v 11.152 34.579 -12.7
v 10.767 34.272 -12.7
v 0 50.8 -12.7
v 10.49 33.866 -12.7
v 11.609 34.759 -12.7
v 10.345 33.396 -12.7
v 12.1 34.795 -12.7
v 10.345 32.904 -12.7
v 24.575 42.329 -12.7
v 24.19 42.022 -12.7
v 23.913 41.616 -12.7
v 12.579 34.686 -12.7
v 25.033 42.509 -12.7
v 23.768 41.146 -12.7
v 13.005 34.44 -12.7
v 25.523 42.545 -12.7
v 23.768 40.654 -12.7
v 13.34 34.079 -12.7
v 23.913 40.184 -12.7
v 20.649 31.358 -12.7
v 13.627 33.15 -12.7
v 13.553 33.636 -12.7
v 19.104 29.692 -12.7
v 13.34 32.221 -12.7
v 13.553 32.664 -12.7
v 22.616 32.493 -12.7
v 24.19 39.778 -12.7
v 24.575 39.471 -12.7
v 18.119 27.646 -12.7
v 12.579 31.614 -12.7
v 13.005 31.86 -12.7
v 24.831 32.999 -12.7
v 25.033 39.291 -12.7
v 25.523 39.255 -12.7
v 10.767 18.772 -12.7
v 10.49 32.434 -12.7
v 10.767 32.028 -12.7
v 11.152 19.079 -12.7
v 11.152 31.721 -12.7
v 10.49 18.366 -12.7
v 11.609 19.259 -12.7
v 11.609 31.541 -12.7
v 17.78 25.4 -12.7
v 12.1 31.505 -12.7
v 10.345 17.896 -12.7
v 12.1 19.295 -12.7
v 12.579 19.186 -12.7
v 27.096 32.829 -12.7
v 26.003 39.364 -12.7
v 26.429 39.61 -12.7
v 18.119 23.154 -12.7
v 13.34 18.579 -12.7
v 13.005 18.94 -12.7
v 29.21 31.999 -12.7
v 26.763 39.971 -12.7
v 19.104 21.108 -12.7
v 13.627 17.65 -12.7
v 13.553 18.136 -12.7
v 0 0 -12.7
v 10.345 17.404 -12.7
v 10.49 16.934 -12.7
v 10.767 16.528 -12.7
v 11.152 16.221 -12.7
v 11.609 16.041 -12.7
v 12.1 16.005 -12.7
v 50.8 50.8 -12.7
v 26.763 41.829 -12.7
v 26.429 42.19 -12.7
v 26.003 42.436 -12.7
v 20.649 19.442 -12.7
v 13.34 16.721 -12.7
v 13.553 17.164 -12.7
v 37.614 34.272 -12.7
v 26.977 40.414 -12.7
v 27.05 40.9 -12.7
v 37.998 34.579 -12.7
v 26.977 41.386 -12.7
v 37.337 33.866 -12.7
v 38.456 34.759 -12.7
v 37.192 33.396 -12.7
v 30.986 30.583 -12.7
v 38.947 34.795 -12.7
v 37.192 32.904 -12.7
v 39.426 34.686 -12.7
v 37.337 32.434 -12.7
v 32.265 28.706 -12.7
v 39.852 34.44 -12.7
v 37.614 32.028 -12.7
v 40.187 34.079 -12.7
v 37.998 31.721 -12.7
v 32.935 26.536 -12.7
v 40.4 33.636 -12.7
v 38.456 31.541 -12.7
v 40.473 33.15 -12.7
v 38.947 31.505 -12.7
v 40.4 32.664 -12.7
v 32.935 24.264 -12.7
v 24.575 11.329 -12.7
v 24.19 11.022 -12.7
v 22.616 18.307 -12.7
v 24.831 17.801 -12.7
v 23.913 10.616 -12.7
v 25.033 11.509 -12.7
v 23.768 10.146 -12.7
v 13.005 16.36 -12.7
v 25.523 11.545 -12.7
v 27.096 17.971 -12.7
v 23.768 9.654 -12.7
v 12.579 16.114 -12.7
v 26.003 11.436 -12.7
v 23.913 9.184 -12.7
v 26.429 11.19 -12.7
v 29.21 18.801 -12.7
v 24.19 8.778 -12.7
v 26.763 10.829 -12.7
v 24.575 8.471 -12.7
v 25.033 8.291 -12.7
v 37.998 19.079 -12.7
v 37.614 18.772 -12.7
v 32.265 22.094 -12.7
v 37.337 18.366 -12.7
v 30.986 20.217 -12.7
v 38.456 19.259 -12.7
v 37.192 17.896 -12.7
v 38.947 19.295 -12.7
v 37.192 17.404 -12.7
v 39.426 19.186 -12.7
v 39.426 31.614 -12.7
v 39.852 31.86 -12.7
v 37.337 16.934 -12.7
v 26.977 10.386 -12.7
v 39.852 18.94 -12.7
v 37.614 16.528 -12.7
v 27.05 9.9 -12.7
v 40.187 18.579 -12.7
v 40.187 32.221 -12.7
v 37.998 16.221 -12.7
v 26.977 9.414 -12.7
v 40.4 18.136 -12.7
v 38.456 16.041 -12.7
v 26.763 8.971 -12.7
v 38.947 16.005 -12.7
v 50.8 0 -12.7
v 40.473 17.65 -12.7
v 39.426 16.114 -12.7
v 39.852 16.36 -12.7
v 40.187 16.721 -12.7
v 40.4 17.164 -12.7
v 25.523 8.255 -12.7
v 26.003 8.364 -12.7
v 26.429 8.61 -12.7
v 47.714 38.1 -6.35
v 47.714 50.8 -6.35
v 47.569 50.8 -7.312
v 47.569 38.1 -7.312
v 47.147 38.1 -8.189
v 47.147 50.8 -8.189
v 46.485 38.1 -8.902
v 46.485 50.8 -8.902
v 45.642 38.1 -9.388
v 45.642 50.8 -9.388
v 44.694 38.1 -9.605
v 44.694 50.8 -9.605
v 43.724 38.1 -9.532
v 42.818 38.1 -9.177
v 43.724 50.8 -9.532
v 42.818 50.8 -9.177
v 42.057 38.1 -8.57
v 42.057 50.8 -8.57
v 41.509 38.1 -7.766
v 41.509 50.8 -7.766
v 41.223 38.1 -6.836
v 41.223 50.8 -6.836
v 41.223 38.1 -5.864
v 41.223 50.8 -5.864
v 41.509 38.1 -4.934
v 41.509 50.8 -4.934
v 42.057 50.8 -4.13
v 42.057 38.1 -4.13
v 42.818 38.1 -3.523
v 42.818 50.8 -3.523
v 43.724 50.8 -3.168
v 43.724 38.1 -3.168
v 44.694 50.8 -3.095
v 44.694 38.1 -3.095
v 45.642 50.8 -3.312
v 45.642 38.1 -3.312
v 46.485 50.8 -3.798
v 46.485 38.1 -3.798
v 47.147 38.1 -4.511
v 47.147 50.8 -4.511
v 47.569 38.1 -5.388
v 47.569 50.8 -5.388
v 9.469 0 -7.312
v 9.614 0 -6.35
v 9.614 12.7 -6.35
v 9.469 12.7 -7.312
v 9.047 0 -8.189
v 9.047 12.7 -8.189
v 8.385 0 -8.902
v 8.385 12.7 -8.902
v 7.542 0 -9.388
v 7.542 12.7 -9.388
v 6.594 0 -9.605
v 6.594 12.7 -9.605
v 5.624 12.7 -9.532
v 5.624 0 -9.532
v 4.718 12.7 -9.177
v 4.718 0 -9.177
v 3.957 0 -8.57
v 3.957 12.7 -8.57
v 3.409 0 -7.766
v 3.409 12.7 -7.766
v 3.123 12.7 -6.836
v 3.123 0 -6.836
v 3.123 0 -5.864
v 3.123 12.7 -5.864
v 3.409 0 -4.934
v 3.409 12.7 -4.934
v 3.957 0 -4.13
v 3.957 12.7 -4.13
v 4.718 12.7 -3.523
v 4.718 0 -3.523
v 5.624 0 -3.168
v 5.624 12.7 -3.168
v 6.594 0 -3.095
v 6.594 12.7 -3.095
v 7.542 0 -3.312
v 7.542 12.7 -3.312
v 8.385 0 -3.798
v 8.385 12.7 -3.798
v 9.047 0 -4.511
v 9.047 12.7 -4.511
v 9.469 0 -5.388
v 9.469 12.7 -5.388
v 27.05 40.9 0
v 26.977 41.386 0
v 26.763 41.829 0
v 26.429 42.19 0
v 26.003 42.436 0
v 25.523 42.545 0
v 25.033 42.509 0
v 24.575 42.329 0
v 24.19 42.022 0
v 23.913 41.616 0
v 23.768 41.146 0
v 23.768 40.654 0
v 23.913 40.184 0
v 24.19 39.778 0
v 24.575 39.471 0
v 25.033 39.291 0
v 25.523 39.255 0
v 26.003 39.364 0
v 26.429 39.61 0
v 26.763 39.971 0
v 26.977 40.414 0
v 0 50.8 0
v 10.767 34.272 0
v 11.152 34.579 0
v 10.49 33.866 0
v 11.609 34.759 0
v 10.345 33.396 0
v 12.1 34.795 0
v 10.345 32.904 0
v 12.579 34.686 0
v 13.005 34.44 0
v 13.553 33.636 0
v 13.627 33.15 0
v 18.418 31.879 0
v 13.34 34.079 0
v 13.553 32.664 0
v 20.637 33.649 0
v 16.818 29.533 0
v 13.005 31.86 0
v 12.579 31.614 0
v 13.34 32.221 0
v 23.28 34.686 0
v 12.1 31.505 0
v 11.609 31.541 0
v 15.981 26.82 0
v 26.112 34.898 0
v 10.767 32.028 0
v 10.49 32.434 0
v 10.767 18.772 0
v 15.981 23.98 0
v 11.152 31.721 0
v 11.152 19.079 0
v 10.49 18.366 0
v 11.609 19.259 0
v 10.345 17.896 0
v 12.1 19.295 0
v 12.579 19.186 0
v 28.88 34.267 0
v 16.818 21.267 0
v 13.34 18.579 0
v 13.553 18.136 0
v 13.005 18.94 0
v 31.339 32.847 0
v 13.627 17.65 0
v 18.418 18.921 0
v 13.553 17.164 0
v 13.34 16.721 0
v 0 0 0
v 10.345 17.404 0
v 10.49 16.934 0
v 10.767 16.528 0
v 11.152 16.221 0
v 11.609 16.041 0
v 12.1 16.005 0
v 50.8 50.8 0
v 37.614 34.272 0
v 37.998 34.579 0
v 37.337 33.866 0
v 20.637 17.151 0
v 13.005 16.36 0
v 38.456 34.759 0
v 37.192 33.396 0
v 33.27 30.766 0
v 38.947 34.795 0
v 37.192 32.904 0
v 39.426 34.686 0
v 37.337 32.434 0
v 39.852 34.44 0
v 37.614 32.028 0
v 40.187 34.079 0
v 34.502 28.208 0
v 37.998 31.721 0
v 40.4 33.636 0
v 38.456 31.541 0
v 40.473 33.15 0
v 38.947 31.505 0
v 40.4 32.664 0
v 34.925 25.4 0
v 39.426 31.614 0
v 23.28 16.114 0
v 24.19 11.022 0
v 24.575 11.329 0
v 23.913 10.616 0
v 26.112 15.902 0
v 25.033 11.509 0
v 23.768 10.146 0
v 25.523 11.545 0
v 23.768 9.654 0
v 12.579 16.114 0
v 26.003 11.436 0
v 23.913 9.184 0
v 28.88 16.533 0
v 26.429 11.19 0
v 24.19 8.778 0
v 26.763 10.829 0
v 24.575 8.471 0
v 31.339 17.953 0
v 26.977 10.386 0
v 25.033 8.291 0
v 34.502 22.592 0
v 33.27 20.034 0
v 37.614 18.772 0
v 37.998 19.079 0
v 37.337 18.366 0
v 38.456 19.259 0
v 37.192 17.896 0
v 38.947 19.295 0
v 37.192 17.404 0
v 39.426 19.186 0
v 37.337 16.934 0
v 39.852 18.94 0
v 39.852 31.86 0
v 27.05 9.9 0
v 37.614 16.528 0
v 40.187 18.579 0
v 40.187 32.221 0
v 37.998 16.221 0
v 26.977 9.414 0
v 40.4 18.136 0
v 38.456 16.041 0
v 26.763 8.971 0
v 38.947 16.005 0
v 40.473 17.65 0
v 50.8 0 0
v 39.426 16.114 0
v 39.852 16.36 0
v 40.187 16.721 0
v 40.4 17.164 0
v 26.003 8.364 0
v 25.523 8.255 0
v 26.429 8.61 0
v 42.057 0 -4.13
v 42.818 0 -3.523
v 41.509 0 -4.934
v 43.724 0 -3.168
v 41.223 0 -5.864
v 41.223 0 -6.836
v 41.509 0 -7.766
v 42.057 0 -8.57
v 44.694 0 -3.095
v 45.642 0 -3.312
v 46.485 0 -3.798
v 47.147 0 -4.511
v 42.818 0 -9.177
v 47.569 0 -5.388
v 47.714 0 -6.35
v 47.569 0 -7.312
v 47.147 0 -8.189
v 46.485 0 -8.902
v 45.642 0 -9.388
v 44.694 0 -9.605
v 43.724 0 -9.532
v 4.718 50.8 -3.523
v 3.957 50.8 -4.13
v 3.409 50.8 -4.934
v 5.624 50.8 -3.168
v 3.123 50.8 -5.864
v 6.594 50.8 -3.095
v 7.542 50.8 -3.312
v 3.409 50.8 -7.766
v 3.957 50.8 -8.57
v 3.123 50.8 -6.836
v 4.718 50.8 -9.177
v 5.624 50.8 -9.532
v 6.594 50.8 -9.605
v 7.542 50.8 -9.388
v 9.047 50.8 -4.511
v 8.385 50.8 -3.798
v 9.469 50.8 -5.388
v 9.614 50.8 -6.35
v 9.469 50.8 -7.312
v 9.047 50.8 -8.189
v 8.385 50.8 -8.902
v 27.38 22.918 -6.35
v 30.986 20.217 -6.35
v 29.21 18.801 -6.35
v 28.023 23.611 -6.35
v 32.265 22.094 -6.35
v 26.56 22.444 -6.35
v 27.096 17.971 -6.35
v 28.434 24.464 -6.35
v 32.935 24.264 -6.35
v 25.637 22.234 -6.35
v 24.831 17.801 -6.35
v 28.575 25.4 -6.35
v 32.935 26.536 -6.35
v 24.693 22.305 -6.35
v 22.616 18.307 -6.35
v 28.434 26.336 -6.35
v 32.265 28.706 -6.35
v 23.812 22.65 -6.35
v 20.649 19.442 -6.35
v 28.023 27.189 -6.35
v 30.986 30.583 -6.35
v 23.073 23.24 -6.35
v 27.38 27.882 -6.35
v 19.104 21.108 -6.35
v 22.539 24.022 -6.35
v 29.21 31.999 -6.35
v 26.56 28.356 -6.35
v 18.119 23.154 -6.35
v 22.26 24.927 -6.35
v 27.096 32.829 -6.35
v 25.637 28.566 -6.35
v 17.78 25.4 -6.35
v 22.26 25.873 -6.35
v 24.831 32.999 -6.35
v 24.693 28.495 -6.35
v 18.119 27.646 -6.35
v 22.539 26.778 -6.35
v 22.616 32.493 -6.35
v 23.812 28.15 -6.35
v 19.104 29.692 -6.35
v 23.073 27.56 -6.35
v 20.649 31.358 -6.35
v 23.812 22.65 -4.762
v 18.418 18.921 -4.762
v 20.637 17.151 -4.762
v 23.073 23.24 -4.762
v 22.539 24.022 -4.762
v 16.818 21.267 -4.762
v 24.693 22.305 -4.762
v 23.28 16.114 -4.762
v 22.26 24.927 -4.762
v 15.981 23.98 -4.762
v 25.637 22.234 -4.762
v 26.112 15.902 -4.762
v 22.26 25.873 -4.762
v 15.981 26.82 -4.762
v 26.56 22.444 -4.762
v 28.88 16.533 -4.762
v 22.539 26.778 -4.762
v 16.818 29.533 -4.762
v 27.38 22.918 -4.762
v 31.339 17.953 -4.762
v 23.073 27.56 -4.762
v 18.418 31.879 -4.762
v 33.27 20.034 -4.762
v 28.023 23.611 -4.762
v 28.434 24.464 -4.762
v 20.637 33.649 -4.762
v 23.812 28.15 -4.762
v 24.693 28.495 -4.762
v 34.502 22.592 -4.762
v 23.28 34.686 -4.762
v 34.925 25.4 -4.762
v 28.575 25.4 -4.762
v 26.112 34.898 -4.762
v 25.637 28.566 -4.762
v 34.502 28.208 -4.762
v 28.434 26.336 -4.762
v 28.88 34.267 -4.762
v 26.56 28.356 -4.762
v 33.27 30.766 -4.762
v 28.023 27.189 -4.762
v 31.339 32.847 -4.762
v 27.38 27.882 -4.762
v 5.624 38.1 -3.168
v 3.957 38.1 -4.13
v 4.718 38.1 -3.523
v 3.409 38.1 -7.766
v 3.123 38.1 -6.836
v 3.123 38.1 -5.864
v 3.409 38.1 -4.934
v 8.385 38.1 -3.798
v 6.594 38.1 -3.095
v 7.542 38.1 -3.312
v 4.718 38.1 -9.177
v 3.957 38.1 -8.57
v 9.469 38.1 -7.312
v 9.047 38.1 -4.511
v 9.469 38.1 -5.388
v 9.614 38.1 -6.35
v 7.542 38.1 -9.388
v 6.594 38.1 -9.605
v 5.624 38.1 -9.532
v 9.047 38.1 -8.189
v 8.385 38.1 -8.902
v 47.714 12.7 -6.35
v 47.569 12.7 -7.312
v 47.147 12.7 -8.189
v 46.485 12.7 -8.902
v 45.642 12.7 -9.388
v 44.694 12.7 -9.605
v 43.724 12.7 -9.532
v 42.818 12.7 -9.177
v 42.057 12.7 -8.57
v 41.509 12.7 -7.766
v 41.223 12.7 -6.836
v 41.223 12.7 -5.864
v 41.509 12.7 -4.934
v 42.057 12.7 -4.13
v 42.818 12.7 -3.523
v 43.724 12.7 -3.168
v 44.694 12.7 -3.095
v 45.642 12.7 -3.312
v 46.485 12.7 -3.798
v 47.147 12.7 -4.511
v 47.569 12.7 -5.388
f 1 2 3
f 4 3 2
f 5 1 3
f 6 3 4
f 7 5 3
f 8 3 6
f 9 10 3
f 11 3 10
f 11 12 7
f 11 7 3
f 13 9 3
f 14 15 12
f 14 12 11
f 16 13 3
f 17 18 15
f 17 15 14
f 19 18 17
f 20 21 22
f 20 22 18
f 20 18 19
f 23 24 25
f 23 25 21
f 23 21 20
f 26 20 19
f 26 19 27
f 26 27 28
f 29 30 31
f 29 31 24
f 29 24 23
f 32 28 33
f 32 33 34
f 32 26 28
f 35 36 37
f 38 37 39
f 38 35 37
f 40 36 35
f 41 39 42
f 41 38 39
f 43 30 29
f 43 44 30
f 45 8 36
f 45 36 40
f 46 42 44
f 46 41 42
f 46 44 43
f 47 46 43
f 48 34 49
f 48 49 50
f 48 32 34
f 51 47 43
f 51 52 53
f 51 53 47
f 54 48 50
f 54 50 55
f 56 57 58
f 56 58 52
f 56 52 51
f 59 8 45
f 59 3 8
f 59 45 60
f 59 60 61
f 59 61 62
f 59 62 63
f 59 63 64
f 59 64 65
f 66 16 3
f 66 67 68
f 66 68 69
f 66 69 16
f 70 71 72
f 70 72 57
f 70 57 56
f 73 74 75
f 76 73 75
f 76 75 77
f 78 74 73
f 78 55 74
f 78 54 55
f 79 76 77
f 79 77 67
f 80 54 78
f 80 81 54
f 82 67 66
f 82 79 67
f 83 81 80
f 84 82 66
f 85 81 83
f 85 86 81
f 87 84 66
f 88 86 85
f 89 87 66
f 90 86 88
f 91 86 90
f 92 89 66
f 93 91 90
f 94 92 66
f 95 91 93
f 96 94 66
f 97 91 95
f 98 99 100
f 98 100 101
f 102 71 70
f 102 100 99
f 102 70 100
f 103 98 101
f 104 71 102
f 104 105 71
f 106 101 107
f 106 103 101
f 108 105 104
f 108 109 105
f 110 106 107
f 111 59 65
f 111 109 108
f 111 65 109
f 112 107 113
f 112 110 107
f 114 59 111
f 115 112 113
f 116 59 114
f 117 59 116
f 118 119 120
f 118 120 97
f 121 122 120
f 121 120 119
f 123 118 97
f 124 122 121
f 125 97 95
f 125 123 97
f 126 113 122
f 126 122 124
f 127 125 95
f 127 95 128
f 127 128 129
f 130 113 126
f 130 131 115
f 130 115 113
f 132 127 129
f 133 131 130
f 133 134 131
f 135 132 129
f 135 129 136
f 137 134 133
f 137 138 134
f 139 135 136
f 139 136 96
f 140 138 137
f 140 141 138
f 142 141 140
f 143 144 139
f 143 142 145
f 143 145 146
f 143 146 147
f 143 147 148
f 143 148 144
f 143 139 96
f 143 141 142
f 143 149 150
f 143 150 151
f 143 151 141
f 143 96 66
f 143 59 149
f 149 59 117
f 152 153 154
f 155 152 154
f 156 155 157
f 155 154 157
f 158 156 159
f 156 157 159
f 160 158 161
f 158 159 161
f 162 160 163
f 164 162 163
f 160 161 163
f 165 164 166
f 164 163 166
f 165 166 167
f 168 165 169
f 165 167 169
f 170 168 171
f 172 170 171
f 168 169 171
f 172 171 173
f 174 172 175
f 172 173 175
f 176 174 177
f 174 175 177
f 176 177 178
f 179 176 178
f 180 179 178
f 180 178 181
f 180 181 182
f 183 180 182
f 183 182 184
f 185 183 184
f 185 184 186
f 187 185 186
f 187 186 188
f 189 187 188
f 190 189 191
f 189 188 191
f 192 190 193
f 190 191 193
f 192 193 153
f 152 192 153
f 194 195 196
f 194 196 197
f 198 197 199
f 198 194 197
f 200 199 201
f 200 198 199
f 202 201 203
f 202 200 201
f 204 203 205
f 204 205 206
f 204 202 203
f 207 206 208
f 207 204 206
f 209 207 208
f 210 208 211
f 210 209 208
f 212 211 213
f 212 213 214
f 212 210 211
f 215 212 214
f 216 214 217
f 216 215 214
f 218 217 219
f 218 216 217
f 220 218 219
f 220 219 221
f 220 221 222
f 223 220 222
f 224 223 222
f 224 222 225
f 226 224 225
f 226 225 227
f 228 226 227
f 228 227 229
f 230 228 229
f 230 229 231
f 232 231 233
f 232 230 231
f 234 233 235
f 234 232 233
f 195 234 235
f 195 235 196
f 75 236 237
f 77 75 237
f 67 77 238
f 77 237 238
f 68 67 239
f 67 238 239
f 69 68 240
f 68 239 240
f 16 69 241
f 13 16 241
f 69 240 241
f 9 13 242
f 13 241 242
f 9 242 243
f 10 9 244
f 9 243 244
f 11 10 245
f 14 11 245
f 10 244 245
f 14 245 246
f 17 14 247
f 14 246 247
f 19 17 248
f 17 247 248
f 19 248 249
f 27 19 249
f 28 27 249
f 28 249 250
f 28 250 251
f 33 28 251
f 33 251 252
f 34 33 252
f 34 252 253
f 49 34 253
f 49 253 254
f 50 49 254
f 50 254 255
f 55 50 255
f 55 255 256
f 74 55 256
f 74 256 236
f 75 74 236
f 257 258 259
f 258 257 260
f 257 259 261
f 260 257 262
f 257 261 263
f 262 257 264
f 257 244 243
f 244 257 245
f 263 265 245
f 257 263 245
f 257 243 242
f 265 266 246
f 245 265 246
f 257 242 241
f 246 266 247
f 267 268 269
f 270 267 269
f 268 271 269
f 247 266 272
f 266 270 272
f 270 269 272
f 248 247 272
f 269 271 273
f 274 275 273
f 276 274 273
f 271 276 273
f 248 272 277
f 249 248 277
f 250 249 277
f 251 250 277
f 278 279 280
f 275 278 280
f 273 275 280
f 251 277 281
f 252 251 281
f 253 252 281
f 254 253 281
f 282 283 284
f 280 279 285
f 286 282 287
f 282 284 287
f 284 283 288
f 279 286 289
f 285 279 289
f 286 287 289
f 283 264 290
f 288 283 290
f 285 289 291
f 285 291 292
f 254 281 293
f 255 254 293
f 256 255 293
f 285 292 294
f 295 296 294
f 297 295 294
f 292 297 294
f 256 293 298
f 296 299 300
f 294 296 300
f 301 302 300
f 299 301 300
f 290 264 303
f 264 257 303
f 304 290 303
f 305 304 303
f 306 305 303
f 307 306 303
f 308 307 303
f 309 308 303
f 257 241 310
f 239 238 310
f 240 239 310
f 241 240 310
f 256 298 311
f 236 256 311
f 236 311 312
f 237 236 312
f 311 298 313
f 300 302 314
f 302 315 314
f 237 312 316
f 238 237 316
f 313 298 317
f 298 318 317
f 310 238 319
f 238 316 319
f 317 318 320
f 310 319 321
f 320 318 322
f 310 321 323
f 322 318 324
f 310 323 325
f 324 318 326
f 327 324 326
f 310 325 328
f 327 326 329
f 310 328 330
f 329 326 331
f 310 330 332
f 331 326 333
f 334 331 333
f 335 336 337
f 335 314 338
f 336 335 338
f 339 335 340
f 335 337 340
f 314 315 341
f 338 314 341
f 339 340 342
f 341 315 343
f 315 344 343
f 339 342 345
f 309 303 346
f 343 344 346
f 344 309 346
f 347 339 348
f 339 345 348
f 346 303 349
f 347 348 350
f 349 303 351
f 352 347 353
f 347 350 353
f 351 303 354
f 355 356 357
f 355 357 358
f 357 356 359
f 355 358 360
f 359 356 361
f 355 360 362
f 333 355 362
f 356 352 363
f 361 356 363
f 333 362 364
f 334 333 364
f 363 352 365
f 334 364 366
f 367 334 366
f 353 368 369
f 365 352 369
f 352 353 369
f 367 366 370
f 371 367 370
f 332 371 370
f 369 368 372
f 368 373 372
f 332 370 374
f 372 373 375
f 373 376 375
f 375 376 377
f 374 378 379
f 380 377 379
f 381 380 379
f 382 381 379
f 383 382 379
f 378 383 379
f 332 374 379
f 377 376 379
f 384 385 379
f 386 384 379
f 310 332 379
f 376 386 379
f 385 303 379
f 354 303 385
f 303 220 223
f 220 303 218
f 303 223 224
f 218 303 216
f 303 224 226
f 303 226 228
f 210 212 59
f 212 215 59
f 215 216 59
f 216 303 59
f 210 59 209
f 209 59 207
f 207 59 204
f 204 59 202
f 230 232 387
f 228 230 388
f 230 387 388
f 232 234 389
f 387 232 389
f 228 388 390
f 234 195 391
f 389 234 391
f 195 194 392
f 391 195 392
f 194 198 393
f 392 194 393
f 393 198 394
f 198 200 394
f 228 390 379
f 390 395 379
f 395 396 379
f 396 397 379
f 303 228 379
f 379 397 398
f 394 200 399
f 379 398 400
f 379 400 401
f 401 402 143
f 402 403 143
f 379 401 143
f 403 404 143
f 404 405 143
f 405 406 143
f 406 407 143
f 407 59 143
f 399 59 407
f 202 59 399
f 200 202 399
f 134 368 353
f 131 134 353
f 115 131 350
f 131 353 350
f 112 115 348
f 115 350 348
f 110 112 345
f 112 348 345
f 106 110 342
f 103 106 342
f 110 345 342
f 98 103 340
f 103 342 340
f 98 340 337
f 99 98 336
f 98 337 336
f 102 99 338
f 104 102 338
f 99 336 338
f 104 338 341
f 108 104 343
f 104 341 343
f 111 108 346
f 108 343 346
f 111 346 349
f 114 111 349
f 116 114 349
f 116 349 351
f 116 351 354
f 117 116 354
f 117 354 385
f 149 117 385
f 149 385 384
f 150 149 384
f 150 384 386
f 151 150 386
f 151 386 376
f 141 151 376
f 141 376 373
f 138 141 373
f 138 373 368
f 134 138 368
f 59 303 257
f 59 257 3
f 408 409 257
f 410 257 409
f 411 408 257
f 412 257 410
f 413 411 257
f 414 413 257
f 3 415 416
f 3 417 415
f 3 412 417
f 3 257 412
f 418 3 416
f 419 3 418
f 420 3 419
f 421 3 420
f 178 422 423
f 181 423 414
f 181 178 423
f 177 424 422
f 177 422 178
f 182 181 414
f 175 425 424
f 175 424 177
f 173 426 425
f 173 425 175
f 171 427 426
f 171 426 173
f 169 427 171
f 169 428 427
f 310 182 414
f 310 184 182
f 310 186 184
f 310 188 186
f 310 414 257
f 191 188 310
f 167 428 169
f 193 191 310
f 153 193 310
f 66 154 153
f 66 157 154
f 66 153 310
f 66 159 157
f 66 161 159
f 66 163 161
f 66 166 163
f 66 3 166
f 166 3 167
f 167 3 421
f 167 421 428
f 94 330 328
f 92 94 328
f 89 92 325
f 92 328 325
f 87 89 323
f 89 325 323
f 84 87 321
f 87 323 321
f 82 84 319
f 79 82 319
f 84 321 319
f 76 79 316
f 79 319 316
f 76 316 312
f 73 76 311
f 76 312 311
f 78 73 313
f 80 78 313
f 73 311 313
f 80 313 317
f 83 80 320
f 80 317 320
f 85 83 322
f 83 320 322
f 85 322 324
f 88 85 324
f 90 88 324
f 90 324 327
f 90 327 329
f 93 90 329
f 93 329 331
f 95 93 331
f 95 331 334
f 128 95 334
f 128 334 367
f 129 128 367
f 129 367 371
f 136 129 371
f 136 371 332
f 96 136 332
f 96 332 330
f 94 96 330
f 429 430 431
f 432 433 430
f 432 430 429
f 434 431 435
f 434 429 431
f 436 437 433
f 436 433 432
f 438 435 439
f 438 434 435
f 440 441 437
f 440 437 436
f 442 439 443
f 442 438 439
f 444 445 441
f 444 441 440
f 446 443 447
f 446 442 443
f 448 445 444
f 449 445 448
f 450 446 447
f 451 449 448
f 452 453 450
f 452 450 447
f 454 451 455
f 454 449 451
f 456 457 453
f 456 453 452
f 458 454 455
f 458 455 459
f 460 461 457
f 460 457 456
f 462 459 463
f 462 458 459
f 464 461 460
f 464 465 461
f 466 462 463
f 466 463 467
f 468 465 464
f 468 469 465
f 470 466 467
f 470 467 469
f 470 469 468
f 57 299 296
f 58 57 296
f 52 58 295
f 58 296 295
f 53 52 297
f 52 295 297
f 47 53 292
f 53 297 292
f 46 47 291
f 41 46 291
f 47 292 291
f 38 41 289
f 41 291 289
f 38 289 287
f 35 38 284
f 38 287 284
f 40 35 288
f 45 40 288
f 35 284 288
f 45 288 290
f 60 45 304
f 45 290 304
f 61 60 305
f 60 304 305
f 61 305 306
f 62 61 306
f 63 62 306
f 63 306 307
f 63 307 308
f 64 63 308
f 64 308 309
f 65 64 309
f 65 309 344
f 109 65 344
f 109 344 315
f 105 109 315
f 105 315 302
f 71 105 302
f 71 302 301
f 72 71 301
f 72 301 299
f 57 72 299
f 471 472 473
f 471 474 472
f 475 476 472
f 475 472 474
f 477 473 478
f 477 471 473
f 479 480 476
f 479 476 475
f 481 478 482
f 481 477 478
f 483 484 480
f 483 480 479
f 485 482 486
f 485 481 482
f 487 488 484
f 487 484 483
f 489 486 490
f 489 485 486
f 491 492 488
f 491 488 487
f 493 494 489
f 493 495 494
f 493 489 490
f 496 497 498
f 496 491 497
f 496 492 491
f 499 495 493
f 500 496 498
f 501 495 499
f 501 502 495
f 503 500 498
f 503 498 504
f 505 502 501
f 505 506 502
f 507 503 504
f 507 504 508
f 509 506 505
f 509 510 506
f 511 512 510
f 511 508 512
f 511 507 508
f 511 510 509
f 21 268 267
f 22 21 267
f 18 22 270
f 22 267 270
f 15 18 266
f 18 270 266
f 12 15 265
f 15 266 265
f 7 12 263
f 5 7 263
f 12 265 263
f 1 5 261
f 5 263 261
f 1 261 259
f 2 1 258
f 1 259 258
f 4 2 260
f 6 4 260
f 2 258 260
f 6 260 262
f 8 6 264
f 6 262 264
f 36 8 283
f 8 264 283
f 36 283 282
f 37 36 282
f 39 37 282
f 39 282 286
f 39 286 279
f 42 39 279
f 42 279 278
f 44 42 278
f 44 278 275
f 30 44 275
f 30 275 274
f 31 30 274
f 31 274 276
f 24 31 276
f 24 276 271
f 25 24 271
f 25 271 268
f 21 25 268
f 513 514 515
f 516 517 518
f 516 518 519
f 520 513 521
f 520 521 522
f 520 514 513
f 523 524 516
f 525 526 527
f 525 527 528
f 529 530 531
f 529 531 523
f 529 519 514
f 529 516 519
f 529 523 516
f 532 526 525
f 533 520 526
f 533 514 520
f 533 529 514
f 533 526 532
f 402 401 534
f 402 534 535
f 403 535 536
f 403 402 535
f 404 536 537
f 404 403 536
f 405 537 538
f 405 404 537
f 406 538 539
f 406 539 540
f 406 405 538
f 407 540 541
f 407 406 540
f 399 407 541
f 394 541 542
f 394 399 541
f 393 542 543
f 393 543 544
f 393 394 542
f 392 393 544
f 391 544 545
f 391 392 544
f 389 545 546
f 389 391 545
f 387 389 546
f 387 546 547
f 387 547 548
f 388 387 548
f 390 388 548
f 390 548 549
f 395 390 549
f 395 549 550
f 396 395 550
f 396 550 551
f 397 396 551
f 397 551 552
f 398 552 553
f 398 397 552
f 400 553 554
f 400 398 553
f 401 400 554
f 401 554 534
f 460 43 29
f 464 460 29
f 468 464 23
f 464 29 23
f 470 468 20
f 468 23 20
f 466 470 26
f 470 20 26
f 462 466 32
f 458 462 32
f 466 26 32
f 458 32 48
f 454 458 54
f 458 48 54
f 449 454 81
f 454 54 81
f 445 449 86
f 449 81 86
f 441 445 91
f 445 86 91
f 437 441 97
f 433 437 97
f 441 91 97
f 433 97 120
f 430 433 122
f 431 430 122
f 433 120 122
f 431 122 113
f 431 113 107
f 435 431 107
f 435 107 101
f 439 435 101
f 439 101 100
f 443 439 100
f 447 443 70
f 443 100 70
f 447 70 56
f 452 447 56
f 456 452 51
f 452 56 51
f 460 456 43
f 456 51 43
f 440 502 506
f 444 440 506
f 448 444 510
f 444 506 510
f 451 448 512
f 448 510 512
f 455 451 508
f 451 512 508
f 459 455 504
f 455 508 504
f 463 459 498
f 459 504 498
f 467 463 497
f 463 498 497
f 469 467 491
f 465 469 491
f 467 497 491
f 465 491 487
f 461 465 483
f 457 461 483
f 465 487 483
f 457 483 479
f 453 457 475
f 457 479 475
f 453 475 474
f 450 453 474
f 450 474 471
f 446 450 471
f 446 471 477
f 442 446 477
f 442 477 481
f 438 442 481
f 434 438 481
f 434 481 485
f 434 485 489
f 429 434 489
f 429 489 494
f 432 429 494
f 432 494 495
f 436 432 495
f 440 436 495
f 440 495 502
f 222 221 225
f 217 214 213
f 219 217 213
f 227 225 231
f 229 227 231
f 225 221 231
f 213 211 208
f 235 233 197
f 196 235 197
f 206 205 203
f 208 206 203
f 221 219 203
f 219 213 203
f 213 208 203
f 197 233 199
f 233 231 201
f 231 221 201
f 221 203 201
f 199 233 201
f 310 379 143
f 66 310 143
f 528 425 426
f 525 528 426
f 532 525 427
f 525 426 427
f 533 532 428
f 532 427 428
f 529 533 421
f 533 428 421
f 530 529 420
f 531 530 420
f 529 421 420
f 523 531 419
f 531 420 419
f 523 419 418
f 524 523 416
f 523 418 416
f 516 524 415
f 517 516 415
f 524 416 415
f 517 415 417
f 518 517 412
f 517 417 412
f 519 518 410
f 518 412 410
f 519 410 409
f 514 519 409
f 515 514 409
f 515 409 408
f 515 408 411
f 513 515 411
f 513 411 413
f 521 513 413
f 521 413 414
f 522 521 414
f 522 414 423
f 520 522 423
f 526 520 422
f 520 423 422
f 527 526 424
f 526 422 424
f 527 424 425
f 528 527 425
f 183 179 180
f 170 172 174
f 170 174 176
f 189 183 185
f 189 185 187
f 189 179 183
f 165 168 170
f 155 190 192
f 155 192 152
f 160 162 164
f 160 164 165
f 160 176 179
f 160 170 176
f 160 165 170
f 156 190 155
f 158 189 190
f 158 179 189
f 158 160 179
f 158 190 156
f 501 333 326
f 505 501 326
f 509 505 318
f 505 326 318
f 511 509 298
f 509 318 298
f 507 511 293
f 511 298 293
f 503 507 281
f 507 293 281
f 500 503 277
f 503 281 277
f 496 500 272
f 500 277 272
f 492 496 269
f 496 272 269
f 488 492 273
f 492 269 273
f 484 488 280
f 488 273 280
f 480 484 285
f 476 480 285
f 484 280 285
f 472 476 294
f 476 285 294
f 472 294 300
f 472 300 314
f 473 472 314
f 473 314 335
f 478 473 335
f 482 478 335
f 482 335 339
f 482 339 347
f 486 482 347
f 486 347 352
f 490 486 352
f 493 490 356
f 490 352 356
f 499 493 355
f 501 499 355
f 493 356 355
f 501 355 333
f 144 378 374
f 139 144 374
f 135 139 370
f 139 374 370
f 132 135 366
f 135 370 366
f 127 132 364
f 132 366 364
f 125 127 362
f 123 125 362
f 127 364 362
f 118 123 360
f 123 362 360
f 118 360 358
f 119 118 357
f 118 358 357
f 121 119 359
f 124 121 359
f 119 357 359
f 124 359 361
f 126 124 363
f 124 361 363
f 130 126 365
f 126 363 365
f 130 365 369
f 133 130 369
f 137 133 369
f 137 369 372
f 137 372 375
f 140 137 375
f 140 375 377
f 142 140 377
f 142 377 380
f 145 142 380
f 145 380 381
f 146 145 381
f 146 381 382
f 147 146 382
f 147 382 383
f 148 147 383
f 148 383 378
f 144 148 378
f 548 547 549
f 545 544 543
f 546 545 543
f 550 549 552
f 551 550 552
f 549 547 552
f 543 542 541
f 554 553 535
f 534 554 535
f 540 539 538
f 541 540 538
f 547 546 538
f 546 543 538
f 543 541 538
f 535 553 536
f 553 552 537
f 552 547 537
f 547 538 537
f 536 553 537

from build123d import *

# Parameters (mm, degrees)
SKETCH1_W           = 50.8
SKETCH1_H           = 12.7
BOSS_EXTRUDE1_DEPTH = 50.8
SKETCH2_R           = 3.175
CUT_EXTRUDE1_DEPTH  = 13.7
SKETCH3_R           = 9.525
CUT_EXTRUDE2_DEPTH  = 4.7625
SKETCH4_R           = 3.2639
CUT_EXTRUDE3_DEPTH  = 12.7
SKETCH5_R           = 1.65
CUT_EXTRUDE4_DEPTH  = 13.7
SKETCH6_R           = 7.62
CUT_EXTRUDE5_DEPTH  = 6.35


with BuildPart() as part:
    # Sketch1 → Boss-Extrude1 (new body)
    with BuildSketch(Plane(origin=(0, 0, 0), x_dir=(1, 0, 0), z_dir=(0, 1, 0))):
        with Locations((25.4, 6.35)):
            Rectangle(SKETCH1_W, SKETCH1_H)
    extrude(amount=BOSS_EXTRUDE1_DEPTH)

    # Sketch2 → Cut-Extrude1 (cut, through all)
    with BuildSketch(Plane.XY):
        with Locations((25.4, 25.4)):
            Circle(SKETCH2_R)
    extrude(amount=-CUT_EXTRUDE1_DEPTH, mode=Mode.SUBTRACT)

    # Sketch3 → Cut-Extrude2 (cut)
    with BuildSketch(Plane.XY):
        with Locations((25.4, 25.4)):
            Circle(SKETCH3_R)
    extrude(amount=-CUT_EXTRUDE2_DEPTH, mode=Mode.SUBTRACT)

    # Sketch4 → Cut-Extrude3 (cut)
    with BuildSketch(Plane(origin=(0, 50.8, 0), x_dir=(1, 0, 0), z_dir=(0, 1, 0))):
        with Locations((6.35, 6.35)):
            Circle(SKETCH4_R)
        with Locations((44.45, 6.35)):
            Circle(SKETCH4_R)
    cut_extrude3 = extrude(amount=-CUT_EXTRUDE3_DEPTH, mode=Mode.SUBTRACT)

    # Mirror1: Cut-Extrude3 across plane
    add(cut_extrude3.mirror(Plane.ZX.offset(25.4)), mode=Mode.SUBTRACT)

    # Sketch5 → Cut-Extrude4 (cut, through all)
    with BuildSketch(Plane.XY):
        with Locations((25.4, 40.9)):
            Circle(SKETCH5_R)
        with Locations((38.823393759, 33.15)):
            Circle(SKETCH5_R)
        with Locations((38.823393759, 17.65)):
            Circle(SKETCH5_R)
        with Locations((25.4, 9.9)):
            Circle(SKETCH5_R)
        with Locations((11.976606241, 17.65)):
            Circle(SKETCH5_R)
        with Locations((11.976606241, 33.15)):
            Circle(SKETCH5_R)
    extrude(amount=-CUT_EXTRUDE4_DEPTH, mode=Mode.SUBTRACT)

    # Sketch6 → Cut-Extrude5 (cut)
    with BuildSketch(Plane(origin=(0, 0, -12.7), x_dir=(-1, 0, 0), z_dir=(0, 0, -1))):
        with Locations((-25.4, 25.4)):
            Circle(SKETCH6_R)
    extrude(amount=-CUT_EXTRUDE5_DEPTH, mode=Mode.SUBTRACT)


solid = part.part
